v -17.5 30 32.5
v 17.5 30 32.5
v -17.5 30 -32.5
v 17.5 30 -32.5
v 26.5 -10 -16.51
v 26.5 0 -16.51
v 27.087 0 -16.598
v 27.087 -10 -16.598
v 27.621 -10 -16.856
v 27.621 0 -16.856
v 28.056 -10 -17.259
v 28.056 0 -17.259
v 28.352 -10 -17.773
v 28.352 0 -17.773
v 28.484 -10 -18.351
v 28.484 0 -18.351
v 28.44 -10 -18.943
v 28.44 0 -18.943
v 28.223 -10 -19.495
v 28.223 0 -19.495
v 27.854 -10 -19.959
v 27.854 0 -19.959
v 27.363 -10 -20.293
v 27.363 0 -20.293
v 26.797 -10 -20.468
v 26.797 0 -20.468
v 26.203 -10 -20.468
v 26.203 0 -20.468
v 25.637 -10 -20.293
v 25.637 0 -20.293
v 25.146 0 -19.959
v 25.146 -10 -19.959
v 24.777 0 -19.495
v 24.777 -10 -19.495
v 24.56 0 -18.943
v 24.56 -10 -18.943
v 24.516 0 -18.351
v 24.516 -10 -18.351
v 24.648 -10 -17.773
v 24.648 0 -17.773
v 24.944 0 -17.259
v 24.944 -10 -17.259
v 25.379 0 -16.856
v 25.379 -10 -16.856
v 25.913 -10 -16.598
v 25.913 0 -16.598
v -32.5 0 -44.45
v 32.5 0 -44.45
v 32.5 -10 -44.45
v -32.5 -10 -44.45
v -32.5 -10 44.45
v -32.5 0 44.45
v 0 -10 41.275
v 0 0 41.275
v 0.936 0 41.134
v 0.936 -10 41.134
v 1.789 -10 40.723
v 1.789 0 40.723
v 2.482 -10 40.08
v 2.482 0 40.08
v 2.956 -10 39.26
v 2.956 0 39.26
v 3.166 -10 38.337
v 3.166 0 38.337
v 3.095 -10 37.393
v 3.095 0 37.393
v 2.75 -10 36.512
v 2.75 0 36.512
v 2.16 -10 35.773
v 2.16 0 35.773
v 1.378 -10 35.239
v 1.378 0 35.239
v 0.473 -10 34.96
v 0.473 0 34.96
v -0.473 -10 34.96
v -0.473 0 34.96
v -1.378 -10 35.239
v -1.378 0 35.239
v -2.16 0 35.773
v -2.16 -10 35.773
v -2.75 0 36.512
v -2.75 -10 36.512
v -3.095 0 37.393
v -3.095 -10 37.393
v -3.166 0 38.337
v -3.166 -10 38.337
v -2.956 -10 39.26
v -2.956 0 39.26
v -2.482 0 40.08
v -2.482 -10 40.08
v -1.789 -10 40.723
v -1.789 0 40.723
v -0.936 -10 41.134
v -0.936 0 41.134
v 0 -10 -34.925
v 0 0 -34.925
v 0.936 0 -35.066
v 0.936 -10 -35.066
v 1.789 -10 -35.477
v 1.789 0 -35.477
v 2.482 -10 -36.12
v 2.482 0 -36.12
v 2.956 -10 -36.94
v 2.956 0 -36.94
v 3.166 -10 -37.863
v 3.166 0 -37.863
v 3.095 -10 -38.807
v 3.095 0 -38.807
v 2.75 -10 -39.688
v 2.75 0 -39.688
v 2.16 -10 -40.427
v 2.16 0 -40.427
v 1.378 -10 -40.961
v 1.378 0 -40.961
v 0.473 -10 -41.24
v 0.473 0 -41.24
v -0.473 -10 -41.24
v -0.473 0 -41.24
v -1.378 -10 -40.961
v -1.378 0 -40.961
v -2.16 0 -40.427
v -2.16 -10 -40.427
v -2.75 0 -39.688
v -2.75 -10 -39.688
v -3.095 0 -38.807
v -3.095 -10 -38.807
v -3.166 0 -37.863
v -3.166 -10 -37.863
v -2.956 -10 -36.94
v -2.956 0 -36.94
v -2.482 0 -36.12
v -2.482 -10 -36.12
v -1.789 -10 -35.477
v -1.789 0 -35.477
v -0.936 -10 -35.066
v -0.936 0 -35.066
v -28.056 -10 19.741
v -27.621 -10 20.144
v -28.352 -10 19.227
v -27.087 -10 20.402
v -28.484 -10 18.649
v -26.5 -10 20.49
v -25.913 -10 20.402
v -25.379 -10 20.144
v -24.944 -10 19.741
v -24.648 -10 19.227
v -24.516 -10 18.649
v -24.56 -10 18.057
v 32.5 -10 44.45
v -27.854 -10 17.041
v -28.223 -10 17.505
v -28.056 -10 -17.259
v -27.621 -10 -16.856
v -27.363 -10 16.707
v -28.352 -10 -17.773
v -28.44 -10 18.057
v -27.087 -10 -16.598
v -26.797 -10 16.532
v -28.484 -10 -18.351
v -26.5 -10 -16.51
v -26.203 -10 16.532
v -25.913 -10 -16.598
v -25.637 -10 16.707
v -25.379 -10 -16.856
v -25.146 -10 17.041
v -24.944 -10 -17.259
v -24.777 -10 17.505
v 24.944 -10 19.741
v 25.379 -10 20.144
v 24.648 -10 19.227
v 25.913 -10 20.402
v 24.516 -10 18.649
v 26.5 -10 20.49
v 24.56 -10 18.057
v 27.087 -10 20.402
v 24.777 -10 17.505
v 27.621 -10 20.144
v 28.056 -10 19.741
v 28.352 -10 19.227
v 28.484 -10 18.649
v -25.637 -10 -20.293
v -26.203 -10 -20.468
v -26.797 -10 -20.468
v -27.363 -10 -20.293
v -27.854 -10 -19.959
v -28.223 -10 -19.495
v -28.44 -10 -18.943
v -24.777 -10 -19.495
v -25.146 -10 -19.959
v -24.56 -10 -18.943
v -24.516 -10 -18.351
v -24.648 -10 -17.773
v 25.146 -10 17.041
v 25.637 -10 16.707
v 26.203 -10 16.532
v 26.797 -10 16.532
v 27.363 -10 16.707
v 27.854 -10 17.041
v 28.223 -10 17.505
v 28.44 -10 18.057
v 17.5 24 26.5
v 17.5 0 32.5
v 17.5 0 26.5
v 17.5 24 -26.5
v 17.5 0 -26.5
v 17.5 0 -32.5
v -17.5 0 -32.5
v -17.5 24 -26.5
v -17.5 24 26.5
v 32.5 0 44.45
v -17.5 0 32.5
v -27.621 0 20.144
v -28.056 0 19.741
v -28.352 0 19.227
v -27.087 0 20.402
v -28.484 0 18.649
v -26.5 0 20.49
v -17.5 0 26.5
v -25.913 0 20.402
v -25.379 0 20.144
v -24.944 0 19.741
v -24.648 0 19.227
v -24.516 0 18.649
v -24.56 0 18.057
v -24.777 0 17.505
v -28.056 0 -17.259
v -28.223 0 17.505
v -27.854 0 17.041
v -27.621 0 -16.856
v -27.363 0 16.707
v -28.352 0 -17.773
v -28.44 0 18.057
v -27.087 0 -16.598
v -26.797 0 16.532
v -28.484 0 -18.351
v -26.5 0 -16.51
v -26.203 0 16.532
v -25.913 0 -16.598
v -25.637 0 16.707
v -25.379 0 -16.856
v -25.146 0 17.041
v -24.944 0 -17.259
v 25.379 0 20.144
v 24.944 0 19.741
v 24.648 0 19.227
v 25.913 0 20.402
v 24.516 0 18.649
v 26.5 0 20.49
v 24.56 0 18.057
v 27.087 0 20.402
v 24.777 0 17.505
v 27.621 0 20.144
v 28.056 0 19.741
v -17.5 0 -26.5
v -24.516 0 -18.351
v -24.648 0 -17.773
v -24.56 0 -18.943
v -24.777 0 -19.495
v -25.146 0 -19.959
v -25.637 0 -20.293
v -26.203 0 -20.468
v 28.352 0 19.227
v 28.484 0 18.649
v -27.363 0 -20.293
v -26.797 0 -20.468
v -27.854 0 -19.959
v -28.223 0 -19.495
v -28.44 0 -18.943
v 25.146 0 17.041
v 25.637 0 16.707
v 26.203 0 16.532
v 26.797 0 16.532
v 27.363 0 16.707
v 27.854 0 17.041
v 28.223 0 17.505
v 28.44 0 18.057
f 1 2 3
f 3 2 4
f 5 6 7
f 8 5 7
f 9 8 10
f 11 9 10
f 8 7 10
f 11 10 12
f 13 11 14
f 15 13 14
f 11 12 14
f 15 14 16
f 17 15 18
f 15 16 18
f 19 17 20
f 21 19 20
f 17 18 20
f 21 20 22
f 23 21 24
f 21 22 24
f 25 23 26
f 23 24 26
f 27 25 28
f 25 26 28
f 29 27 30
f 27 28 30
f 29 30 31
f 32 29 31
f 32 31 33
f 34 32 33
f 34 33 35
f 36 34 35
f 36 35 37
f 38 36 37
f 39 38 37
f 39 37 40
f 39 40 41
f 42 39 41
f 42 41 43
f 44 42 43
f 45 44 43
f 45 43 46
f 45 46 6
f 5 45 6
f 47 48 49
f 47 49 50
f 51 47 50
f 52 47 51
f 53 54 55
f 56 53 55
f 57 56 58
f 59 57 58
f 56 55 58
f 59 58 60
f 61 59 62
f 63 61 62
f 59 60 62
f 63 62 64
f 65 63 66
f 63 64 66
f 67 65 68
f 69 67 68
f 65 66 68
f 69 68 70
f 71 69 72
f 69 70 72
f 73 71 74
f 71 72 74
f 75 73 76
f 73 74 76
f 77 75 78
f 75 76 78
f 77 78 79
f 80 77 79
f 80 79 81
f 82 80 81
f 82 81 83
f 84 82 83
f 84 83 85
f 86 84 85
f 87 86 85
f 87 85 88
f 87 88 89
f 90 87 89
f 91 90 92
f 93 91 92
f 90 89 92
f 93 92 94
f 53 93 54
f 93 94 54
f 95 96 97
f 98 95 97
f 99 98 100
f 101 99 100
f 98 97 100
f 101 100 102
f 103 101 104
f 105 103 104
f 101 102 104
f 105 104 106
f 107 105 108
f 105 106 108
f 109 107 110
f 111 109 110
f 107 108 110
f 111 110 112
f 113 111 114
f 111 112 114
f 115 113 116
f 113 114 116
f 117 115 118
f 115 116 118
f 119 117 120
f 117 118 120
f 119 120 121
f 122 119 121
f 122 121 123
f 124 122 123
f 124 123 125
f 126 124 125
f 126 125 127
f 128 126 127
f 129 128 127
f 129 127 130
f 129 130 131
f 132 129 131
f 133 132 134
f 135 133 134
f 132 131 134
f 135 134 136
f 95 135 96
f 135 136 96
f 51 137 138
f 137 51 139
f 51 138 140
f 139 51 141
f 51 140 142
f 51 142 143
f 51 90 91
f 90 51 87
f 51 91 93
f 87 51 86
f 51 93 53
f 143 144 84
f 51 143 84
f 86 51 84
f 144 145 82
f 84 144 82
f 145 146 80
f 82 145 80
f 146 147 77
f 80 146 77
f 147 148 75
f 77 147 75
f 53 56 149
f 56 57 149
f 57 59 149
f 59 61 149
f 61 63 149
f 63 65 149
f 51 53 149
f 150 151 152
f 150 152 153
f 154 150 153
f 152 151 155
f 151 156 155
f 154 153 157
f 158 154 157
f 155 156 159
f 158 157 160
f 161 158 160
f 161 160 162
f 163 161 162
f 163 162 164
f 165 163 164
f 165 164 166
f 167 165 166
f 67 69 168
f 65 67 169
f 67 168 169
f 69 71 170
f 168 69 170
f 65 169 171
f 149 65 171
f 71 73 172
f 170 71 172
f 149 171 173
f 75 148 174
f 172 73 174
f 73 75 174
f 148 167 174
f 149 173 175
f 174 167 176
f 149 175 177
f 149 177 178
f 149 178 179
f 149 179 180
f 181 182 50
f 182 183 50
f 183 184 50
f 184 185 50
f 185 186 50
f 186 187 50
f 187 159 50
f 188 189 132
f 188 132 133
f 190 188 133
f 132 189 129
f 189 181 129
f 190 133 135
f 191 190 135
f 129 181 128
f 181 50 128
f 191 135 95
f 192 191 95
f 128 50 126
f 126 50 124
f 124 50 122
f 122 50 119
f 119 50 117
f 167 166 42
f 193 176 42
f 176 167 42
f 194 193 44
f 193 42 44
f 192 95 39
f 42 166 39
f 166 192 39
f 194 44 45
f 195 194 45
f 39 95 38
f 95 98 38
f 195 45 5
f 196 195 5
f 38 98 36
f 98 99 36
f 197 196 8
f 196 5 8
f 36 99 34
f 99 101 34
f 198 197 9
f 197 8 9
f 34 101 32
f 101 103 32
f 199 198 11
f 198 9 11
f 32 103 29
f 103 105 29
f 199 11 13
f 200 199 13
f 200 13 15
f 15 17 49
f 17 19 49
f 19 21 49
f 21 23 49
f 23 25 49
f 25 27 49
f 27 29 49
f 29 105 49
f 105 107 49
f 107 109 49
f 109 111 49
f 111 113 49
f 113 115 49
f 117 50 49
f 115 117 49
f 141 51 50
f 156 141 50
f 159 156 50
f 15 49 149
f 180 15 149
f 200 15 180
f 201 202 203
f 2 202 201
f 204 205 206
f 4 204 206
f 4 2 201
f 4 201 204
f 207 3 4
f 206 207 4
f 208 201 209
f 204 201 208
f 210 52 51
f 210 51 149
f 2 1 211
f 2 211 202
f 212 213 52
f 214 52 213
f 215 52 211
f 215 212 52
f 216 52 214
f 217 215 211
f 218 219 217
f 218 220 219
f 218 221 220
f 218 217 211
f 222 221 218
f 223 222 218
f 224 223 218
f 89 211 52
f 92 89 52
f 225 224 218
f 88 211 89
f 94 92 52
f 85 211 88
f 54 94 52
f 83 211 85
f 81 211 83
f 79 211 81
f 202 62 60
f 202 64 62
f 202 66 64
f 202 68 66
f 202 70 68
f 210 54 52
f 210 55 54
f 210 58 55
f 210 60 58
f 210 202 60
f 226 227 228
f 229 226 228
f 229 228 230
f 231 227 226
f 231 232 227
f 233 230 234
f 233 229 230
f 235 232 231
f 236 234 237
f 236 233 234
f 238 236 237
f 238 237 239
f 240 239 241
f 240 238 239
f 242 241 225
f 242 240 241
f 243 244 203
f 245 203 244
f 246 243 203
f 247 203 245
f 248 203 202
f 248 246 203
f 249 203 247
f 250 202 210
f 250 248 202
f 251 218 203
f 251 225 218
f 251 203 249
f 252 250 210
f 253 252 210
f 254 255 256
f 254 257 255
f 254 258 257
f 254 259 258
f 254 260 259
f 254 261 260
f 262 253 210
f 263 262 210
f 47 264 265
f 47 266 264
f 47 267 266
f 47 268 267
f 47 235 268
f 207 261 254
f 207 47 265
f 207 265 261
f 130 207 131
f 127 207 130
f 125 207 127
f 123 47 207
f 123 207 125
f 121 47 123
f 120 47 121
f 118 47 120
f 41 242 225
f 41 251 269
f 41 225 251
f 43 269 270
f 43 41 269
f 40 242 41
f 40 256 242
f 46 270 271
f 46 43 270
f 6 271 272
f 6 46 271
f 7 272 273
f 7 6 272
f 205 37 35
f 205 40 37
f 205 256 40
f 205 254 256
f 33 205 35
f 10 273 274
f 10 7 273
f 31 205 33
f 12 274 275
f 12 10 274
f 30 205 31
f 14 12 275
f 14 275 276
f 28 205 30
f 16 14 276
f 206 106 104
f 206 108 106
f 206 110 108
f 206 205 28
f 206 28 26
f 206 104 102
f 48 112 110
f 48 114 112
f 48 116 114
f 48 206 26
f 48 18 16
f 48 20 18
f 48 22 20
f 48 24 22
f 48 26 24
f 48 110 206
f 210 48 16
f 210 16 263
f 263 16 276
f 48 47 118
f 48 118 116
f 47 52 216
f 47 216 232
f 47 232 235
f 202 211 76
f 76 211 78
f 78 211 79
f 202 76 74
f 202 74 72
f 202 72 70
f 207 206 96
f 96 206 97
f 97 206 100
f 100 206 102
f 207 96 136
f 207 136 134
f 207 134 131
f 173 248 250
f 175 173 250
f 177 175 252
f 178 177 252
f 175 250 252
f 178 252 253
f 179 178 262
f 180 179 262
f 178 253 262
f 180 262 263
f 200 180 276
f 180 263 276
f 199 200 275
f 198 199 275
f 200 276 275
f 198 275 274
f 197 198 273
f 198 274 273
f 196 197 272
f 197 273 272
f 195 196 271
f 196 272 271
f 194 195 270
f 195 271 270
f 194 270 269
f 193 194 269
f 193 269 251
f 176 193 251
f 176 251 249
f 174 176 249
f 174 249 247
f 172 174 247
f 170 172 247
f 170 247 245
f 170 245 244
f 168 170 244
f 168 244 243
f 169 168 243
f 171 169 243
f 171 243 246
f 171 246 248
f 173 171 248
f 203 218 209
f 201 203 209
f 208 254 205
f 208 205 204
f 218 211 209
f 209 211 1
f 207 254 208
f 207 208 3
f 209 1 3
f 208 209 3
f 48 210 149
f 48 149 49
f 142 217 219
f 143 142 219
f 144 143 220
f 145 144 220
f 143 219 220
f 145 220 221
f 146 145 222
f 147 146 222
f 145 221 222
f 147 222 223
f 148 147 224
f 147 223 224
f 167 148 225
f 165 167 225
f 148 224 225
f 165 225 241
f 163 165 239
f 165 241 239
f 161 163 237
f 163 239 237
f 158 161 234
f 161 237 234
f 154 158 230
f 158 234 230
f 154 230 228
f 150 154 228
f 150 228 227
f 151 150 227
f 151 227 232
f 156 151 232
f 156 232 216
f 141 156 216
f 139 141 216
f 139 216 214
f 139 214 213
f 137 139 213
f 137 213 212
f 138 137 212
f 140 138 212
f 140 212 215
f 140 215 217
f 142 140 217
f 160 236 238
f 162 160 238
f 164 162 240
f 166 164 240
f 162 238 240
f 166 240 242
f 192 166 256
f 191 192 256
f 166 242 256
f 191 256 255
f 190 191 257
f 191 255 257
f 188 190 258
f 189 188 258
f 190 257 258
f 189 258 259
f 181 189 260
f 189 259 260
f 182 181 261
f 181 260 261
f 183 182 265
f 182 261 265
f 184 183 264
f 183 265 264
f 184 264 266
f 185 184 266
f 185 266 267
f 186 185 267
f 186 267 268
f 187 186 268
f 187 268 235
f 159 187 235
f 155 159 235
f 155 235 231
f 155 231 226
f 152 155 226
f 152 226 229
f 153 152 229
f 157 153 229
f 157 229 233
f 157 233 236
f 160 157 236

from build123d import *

# Parameters (mm, degrees)
SKETCH2_W           = 65
SKETCH2_H           = 65
BOSS_EXTRUDE1_DEPTH = 10
SKETCH3_W           = 65
SKETCH3_H           = 6
SKETCH3_W_2         = 6
SKETCH3_H_2         = 24
BOSS_EXTRUDE2_DEPTH = 17.5
SKETCH4_R           = 3.175
BOSS_EXTRUDE3_DEPTH = 10
SKETCH5_R           = 1.99
CUT_EXTRUDE1_DEPTH  = 63.706080247


with BuildPart() as part:
    # Sketch2 → Boss-Extrude1 (new body)
    with BuildSketch(Plane(origin=(0, 0, 0), x_dir=(1, 0, 0), z_dir=(0, 1, 0))):
        Rectangle(SKETCH2_W, SKETCH2_H)
    extrude(amount=-BOSS_EXTRUDE1_DEPTH)

    # Sketch3 → Boss-Extrude2 (add, symmetric)
    with BuildSketch(Plane(origin=(0, 0, 0), x_dir=(0, 0, -1), z_dir=(1, 0, 0))):
        with Locations((0, 27)):
            Rectangle(SKETCH3_W, SKETCH3_H)
        with Locations((29.5, 12)):
            Rectangle(SKETCH3_W_2, SKETCH3_H_2)
        with Locations((-29.5, 12)):
            Rectangle(SKETCH3_W_2, SKETCH3_H_2)
    extrude(amount=BOSS_EXTRUDE2_DEPTH, both=True)

    # Sketch4 → Boss-Extrude3 (add)
    # profile 1 of 2: a face of its own
    with BuildSketch(Plane(origin=(0, 0, 0), x_dir=(1, 0, 0), z_dir=(0, 1, 0))):
        Polygon((32.5, 44.45), (-32.5, 44.45), (-32.5, 32.5), (-17.5, 32.5), (-17.5, 26.5), (17.5, 26.5), (17.5, 32.5), (32.5, 32.5), align=None)
        with Locations(Location((0, 38.1, 0), (0, 0, 270))):
            Circle(SKETCH4_R, mode=Mode.SUBTRACT)
    # profile 2 of 2: a face of its own
    with BuildSketch(Plane(origin=(0, 0, 0), x_dir=(1, 0, 0), z_dir=(0, 1, 0))):
        Polygon((-17.5, -32.5), (-32.5, -32.5), (-32.5, -44.45), (32.5, -44.45), (32.5, -32.5), (17.5, -32.5), (17.5, -26.5), (-17.5, -26.5), align=None)
        with Locations(Location((0, -38.1, 0), (0, 0, 270))):
            Circle(SKETCH4_R, mode=Mode.SUBTRACT)
    extrude(amount=-BOSS_EXTRUDE3_DEPTH)

    # Sketch5 → Cut-Extrude1 (cut, through all)
    with BuildSketch(Plane(origin=(0, 0, 0), x_dir=(1, 0, 0), z_dir=(0, 1, 0))):
        with Locations(Location((-26.5, 18.5, 0), (0, 0, 270))):
            Circle(SKETCH5_R)
        with Locations(Location((26.5, 18.5, 0), (0, 0, 270))):
            Circle(SKETCH5_R)
        with Locations(Location((26.5, -18.5, 0), (0, 0, 270))):
            Circle(SKETCH5_R)
        with Locations(Location((-26.5, -18.5, 0), (0, 0, 270))):
            Circle(SKETCH5_R)
    extrude(amount=-CUT_EXTRUDE1_DEPTH, mode=Mode.SUBTRACT)


solid = part.part
